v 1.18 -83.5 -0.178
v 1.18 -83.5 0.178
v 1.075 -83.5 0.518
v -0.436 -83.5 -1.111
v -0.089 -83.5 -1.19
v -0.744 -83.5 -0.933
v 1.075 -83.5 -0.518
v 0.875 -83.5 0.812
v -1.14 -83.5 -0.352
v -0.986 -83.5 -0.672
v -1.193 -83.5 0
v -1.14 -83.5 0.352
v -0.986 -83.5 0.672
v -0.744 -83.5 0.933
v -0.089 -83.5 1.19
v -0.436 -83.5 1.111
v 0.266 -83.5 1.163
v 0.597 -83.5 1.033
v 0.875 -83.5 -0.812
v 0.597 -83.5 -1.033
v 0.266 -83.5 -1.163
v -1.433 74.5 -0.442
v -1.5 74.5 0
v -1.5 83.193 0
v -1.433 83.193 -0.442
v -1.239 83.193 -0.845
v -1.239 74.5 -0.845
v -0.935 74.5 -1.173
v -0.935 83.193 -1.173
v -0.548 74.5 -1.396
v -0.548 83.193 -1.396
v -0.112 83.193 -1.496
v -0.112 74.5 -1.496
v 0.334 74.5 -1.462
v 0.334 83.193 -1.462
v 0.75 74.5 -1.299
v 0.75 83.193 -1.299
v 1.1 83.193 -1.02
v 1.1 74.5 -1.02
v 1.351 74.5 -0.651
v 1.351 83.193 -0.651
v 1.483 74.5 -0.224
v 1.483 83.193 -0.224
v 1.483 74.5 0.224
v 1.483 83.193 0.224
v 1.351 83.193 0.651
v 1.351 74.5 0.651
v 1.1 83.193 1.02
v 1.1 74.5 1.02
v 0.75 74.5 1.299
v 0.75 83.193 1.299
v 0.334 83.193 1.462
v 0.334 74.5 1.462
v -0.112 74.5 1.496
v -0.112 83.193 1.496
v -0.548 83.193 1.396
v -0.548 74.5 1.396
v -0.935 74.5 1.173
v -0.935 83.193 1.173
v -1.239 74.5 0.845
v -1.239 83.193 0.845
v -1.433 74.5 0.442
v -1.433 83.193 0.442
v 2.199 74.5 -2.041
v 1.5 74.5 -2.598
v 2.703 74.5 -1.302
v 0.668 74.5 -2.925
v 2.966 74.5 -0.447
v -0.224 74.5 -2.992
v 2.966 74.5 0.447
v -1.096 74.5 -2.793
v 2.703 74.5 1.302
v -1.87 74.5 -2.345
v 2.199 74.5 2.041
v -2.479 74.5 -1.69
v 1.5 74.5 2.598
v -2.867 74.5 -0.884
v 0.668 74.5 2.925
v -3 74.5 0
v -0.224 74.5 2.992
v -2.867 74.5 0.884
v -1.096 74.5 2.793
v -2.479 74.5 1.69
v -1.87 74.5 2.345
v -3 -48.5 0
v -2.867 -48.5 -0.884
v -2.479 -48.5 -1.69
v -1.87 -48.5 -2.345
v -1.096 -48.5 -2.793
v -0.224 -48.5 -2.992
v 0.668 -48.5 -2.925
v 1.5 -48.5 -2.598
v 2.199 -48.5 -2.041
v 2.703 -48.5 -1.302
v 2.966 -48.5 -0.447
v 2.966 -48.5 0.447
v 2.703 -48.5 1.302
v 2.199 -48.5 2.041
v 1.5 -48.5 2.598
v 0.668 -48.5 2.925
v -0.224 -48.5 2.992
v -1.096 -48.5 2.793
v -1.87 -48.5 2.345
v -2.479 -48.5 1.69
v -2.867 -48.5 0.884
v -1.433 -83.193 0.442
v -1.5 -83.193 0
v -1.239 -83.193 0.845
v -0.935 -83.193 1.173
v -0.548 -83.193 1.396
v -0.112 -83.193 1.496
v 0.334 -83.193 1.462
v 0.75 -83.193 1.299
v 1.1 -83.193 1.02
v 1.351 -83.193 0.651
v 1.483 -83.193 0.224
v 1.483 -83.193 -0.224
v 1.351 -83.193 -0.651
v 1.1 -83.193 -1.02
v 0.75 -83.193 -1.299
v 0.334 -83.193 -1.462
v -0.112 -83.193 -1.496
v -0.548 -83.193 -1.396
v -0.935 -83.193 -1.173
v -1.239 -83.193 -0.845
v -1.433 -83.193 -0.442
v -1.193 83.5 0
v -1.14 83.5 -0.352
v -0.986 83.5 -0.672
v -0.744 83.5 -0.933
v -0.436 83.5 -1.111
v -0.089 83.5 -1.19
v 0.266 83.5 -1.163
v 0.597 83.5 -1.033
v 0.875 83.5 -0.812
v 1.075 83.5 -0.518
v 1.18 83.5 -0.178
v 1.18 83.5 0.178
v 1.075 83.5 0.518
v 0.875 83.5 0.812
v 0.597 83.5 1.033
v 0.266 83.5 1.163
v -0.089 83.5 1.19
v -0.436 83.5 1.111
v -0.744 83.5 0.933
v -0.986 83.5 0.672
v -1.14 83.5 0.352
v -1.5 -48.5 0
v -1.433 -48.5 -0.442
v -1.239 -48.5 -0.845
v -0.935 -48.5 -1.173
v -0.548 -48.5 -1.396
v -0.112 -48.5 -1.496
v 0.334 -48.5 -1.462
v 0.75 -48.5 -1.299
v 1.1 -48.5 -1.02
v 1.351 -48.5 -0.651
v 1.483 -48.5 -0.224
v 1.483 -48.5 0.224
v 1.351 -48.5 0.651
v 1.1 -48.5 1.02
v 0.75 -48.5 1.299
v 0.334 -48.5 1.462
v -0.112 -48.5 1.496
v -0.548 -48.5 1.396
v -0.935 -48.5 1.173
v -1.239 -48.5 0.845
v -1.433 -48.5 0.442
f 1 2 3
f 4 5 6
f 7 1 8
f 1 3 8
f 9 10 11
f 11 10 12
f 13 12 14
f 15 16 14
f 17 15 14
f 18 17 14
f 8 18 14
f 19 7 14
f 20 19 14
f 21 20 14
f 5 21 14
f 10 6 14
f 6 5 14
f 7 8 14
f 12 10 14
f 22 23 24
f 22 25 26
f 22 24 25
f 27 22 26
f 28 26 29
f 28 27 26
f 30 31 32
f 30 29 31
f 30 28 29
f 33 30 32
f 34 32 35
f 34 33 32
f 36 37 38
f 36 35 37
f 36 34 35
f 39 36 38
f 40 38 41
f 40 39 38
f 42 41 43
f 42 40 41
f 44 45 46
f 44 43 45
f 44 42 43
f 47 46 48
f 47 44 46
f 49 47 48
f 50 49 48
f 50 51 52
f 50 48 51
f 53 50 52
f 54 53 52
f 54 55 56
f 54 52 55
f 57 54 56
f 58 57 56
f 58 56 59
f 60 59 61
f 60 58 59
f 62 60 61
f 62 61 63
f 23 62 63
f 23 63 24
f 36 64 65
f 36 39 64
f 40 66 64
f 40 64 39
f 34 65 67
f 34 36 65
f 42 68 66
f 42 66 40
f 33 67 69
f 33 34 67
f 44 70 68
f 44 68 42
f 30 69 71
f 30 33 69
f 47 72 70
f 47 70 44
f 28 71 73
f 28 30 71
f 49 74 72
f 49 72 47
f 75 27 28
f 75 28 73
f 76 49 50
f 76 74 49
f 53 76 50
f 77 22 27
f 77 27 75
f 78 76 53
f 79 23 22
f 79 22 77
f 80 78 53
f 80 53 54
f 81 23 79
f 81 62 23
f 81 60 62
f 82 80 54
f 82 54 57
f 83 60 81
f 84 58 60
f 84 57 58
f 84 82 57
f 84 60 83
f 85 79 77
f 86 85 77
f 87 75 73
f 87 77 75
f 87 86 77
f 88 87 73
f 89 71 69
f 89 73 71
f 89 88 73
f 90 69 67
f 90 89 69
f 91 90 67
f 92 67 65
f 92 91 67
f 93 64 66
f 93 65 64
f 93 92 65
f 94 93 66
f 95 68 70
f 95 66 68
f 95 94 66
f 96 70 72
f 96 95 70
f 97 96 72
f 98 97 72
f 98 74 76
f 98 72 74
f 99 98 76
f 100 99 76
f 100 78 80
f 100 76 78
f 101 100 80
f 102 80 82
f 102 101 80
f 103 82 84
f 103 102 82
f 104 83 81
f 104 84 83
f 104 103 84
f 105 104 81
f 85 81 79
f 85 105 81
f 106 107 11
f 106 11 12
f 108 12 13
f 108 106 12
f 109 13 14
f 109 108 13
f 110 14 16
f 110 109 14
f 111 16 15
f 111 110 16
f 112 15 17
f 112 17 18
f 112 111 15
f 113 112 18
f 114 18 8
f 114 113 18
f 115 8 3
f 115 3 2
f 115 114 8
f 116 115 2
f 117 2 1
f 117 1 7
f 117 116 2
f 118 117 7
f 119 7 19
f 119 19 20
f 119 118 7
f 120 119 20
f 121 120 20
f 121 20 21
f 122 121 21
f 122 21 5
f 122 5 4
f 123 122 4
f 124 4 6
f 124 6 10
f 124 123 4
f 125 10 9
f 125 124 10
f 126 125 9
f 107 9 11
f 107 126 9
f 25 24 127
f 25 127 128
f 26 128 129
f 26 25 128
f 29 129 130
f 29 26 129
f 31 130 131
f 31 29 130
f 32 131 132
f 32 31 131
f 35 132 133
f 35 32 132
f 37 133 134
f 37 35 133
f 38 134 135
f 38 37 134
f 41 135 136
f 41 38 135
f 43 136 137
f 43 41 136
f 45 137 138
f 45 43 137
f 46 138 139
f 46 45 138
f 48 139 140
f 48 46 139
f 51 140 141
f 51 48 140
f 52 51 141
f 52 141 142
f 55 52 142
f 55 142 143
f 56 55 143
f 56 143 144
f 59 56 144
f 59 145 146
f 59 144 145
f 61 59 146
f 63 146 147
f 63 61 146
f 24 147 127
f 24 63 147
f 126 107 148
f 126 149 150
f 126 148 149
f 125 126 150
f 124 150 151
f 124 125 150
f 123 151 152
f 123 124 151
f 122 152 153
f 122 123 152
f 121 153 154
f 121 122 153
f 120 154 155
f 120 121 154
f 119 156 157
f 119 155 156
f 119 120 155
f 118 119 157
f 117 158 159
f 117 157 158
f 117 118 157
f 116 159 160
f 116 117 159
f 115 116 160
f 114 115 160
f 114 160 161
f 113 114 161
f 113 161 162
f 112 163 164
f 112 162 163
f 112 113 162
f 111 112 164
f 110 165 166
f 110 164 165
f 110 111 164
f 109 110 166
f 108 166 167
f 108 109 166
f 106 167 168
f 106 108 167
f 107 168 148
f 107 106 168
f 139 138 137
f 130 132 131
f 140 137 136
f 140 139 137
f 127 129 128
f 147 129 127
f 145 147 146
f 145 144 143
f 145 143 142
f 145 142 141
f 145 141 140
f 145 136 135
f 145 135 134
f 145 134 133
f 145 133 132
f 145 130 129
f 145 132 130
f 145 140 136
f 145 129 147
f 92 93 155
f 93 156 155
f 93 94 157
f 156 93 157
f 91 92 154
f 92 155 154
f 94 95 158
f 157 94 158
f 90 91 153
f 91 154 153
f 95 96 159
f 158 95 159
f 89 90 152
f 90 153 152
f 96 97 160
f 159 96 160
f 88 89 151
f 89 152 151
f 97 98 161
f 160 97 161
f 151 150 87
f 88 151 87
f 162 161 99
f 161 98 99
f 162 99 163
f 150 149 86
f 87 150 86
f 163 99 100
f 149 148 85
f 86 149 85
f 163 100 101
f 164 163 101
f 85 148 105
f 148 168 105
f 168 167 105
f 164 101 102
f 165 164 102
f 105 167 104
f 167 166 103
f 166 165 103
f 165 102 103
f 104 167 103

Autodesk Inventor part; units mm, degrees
ref_plane "YZ Plane" through (0, 0, 0) normal (1, 0, 0) x (0, 1, 0)
ref_plane "XZ Plane" through (0, 0, 0) normal (0, 1, 0) x (-1, 0, 0)
ref_plane "XY Plane" through (0, 0, 0) normal (0, 0, 1) x (1, 0, 0)
sketch "Boceto1" plane through (0, 0, 0) normal (0, 0, 1) x (1, 0, 0)
  line L0 (0, -83.5) -> (0, 83.5)
  line L1 (0, 83.5) -> (-1.5, 83.5)
  line L2 (-1.5, 83.5) -> (-1.5, 74.5)
  line L3 (-1.5, 74.5) -> (-3, 74.5)
  line L4 (-3, 74.5) -> (-3, -48.5)
  line L5 (-3, -48.5) -> (-1.5, -48.5)
  line L6 (-1.5, -48.5) -> (-1.5, -83.5)
  line L7 (-1.5, -83.5) -> (0, -83.5)
  point P0 (0, 0)
  point P1 (0, 0)
  dimension "d1" = 3
  dimension "d2" = 6
  dimension "d3" = 9
  dimension "d4" = 123
  dimension "d8" = 35
revolve "Revolución1" add sketch "Boceto1" angle 360 about axis through (0, -83.5, 0) along (0, 1, 0)
thread "Rosca1" size "M3x0.5" class "6g" standard "ANSI Metric M Profile" full length
chamfer "Chaflán1" distance 0.3067 angle 45 2 edges at (1.5, 83.5, 0) (1.5, -83.5, 0)
properties part number "Columnas" material "Aluminio 6061"
